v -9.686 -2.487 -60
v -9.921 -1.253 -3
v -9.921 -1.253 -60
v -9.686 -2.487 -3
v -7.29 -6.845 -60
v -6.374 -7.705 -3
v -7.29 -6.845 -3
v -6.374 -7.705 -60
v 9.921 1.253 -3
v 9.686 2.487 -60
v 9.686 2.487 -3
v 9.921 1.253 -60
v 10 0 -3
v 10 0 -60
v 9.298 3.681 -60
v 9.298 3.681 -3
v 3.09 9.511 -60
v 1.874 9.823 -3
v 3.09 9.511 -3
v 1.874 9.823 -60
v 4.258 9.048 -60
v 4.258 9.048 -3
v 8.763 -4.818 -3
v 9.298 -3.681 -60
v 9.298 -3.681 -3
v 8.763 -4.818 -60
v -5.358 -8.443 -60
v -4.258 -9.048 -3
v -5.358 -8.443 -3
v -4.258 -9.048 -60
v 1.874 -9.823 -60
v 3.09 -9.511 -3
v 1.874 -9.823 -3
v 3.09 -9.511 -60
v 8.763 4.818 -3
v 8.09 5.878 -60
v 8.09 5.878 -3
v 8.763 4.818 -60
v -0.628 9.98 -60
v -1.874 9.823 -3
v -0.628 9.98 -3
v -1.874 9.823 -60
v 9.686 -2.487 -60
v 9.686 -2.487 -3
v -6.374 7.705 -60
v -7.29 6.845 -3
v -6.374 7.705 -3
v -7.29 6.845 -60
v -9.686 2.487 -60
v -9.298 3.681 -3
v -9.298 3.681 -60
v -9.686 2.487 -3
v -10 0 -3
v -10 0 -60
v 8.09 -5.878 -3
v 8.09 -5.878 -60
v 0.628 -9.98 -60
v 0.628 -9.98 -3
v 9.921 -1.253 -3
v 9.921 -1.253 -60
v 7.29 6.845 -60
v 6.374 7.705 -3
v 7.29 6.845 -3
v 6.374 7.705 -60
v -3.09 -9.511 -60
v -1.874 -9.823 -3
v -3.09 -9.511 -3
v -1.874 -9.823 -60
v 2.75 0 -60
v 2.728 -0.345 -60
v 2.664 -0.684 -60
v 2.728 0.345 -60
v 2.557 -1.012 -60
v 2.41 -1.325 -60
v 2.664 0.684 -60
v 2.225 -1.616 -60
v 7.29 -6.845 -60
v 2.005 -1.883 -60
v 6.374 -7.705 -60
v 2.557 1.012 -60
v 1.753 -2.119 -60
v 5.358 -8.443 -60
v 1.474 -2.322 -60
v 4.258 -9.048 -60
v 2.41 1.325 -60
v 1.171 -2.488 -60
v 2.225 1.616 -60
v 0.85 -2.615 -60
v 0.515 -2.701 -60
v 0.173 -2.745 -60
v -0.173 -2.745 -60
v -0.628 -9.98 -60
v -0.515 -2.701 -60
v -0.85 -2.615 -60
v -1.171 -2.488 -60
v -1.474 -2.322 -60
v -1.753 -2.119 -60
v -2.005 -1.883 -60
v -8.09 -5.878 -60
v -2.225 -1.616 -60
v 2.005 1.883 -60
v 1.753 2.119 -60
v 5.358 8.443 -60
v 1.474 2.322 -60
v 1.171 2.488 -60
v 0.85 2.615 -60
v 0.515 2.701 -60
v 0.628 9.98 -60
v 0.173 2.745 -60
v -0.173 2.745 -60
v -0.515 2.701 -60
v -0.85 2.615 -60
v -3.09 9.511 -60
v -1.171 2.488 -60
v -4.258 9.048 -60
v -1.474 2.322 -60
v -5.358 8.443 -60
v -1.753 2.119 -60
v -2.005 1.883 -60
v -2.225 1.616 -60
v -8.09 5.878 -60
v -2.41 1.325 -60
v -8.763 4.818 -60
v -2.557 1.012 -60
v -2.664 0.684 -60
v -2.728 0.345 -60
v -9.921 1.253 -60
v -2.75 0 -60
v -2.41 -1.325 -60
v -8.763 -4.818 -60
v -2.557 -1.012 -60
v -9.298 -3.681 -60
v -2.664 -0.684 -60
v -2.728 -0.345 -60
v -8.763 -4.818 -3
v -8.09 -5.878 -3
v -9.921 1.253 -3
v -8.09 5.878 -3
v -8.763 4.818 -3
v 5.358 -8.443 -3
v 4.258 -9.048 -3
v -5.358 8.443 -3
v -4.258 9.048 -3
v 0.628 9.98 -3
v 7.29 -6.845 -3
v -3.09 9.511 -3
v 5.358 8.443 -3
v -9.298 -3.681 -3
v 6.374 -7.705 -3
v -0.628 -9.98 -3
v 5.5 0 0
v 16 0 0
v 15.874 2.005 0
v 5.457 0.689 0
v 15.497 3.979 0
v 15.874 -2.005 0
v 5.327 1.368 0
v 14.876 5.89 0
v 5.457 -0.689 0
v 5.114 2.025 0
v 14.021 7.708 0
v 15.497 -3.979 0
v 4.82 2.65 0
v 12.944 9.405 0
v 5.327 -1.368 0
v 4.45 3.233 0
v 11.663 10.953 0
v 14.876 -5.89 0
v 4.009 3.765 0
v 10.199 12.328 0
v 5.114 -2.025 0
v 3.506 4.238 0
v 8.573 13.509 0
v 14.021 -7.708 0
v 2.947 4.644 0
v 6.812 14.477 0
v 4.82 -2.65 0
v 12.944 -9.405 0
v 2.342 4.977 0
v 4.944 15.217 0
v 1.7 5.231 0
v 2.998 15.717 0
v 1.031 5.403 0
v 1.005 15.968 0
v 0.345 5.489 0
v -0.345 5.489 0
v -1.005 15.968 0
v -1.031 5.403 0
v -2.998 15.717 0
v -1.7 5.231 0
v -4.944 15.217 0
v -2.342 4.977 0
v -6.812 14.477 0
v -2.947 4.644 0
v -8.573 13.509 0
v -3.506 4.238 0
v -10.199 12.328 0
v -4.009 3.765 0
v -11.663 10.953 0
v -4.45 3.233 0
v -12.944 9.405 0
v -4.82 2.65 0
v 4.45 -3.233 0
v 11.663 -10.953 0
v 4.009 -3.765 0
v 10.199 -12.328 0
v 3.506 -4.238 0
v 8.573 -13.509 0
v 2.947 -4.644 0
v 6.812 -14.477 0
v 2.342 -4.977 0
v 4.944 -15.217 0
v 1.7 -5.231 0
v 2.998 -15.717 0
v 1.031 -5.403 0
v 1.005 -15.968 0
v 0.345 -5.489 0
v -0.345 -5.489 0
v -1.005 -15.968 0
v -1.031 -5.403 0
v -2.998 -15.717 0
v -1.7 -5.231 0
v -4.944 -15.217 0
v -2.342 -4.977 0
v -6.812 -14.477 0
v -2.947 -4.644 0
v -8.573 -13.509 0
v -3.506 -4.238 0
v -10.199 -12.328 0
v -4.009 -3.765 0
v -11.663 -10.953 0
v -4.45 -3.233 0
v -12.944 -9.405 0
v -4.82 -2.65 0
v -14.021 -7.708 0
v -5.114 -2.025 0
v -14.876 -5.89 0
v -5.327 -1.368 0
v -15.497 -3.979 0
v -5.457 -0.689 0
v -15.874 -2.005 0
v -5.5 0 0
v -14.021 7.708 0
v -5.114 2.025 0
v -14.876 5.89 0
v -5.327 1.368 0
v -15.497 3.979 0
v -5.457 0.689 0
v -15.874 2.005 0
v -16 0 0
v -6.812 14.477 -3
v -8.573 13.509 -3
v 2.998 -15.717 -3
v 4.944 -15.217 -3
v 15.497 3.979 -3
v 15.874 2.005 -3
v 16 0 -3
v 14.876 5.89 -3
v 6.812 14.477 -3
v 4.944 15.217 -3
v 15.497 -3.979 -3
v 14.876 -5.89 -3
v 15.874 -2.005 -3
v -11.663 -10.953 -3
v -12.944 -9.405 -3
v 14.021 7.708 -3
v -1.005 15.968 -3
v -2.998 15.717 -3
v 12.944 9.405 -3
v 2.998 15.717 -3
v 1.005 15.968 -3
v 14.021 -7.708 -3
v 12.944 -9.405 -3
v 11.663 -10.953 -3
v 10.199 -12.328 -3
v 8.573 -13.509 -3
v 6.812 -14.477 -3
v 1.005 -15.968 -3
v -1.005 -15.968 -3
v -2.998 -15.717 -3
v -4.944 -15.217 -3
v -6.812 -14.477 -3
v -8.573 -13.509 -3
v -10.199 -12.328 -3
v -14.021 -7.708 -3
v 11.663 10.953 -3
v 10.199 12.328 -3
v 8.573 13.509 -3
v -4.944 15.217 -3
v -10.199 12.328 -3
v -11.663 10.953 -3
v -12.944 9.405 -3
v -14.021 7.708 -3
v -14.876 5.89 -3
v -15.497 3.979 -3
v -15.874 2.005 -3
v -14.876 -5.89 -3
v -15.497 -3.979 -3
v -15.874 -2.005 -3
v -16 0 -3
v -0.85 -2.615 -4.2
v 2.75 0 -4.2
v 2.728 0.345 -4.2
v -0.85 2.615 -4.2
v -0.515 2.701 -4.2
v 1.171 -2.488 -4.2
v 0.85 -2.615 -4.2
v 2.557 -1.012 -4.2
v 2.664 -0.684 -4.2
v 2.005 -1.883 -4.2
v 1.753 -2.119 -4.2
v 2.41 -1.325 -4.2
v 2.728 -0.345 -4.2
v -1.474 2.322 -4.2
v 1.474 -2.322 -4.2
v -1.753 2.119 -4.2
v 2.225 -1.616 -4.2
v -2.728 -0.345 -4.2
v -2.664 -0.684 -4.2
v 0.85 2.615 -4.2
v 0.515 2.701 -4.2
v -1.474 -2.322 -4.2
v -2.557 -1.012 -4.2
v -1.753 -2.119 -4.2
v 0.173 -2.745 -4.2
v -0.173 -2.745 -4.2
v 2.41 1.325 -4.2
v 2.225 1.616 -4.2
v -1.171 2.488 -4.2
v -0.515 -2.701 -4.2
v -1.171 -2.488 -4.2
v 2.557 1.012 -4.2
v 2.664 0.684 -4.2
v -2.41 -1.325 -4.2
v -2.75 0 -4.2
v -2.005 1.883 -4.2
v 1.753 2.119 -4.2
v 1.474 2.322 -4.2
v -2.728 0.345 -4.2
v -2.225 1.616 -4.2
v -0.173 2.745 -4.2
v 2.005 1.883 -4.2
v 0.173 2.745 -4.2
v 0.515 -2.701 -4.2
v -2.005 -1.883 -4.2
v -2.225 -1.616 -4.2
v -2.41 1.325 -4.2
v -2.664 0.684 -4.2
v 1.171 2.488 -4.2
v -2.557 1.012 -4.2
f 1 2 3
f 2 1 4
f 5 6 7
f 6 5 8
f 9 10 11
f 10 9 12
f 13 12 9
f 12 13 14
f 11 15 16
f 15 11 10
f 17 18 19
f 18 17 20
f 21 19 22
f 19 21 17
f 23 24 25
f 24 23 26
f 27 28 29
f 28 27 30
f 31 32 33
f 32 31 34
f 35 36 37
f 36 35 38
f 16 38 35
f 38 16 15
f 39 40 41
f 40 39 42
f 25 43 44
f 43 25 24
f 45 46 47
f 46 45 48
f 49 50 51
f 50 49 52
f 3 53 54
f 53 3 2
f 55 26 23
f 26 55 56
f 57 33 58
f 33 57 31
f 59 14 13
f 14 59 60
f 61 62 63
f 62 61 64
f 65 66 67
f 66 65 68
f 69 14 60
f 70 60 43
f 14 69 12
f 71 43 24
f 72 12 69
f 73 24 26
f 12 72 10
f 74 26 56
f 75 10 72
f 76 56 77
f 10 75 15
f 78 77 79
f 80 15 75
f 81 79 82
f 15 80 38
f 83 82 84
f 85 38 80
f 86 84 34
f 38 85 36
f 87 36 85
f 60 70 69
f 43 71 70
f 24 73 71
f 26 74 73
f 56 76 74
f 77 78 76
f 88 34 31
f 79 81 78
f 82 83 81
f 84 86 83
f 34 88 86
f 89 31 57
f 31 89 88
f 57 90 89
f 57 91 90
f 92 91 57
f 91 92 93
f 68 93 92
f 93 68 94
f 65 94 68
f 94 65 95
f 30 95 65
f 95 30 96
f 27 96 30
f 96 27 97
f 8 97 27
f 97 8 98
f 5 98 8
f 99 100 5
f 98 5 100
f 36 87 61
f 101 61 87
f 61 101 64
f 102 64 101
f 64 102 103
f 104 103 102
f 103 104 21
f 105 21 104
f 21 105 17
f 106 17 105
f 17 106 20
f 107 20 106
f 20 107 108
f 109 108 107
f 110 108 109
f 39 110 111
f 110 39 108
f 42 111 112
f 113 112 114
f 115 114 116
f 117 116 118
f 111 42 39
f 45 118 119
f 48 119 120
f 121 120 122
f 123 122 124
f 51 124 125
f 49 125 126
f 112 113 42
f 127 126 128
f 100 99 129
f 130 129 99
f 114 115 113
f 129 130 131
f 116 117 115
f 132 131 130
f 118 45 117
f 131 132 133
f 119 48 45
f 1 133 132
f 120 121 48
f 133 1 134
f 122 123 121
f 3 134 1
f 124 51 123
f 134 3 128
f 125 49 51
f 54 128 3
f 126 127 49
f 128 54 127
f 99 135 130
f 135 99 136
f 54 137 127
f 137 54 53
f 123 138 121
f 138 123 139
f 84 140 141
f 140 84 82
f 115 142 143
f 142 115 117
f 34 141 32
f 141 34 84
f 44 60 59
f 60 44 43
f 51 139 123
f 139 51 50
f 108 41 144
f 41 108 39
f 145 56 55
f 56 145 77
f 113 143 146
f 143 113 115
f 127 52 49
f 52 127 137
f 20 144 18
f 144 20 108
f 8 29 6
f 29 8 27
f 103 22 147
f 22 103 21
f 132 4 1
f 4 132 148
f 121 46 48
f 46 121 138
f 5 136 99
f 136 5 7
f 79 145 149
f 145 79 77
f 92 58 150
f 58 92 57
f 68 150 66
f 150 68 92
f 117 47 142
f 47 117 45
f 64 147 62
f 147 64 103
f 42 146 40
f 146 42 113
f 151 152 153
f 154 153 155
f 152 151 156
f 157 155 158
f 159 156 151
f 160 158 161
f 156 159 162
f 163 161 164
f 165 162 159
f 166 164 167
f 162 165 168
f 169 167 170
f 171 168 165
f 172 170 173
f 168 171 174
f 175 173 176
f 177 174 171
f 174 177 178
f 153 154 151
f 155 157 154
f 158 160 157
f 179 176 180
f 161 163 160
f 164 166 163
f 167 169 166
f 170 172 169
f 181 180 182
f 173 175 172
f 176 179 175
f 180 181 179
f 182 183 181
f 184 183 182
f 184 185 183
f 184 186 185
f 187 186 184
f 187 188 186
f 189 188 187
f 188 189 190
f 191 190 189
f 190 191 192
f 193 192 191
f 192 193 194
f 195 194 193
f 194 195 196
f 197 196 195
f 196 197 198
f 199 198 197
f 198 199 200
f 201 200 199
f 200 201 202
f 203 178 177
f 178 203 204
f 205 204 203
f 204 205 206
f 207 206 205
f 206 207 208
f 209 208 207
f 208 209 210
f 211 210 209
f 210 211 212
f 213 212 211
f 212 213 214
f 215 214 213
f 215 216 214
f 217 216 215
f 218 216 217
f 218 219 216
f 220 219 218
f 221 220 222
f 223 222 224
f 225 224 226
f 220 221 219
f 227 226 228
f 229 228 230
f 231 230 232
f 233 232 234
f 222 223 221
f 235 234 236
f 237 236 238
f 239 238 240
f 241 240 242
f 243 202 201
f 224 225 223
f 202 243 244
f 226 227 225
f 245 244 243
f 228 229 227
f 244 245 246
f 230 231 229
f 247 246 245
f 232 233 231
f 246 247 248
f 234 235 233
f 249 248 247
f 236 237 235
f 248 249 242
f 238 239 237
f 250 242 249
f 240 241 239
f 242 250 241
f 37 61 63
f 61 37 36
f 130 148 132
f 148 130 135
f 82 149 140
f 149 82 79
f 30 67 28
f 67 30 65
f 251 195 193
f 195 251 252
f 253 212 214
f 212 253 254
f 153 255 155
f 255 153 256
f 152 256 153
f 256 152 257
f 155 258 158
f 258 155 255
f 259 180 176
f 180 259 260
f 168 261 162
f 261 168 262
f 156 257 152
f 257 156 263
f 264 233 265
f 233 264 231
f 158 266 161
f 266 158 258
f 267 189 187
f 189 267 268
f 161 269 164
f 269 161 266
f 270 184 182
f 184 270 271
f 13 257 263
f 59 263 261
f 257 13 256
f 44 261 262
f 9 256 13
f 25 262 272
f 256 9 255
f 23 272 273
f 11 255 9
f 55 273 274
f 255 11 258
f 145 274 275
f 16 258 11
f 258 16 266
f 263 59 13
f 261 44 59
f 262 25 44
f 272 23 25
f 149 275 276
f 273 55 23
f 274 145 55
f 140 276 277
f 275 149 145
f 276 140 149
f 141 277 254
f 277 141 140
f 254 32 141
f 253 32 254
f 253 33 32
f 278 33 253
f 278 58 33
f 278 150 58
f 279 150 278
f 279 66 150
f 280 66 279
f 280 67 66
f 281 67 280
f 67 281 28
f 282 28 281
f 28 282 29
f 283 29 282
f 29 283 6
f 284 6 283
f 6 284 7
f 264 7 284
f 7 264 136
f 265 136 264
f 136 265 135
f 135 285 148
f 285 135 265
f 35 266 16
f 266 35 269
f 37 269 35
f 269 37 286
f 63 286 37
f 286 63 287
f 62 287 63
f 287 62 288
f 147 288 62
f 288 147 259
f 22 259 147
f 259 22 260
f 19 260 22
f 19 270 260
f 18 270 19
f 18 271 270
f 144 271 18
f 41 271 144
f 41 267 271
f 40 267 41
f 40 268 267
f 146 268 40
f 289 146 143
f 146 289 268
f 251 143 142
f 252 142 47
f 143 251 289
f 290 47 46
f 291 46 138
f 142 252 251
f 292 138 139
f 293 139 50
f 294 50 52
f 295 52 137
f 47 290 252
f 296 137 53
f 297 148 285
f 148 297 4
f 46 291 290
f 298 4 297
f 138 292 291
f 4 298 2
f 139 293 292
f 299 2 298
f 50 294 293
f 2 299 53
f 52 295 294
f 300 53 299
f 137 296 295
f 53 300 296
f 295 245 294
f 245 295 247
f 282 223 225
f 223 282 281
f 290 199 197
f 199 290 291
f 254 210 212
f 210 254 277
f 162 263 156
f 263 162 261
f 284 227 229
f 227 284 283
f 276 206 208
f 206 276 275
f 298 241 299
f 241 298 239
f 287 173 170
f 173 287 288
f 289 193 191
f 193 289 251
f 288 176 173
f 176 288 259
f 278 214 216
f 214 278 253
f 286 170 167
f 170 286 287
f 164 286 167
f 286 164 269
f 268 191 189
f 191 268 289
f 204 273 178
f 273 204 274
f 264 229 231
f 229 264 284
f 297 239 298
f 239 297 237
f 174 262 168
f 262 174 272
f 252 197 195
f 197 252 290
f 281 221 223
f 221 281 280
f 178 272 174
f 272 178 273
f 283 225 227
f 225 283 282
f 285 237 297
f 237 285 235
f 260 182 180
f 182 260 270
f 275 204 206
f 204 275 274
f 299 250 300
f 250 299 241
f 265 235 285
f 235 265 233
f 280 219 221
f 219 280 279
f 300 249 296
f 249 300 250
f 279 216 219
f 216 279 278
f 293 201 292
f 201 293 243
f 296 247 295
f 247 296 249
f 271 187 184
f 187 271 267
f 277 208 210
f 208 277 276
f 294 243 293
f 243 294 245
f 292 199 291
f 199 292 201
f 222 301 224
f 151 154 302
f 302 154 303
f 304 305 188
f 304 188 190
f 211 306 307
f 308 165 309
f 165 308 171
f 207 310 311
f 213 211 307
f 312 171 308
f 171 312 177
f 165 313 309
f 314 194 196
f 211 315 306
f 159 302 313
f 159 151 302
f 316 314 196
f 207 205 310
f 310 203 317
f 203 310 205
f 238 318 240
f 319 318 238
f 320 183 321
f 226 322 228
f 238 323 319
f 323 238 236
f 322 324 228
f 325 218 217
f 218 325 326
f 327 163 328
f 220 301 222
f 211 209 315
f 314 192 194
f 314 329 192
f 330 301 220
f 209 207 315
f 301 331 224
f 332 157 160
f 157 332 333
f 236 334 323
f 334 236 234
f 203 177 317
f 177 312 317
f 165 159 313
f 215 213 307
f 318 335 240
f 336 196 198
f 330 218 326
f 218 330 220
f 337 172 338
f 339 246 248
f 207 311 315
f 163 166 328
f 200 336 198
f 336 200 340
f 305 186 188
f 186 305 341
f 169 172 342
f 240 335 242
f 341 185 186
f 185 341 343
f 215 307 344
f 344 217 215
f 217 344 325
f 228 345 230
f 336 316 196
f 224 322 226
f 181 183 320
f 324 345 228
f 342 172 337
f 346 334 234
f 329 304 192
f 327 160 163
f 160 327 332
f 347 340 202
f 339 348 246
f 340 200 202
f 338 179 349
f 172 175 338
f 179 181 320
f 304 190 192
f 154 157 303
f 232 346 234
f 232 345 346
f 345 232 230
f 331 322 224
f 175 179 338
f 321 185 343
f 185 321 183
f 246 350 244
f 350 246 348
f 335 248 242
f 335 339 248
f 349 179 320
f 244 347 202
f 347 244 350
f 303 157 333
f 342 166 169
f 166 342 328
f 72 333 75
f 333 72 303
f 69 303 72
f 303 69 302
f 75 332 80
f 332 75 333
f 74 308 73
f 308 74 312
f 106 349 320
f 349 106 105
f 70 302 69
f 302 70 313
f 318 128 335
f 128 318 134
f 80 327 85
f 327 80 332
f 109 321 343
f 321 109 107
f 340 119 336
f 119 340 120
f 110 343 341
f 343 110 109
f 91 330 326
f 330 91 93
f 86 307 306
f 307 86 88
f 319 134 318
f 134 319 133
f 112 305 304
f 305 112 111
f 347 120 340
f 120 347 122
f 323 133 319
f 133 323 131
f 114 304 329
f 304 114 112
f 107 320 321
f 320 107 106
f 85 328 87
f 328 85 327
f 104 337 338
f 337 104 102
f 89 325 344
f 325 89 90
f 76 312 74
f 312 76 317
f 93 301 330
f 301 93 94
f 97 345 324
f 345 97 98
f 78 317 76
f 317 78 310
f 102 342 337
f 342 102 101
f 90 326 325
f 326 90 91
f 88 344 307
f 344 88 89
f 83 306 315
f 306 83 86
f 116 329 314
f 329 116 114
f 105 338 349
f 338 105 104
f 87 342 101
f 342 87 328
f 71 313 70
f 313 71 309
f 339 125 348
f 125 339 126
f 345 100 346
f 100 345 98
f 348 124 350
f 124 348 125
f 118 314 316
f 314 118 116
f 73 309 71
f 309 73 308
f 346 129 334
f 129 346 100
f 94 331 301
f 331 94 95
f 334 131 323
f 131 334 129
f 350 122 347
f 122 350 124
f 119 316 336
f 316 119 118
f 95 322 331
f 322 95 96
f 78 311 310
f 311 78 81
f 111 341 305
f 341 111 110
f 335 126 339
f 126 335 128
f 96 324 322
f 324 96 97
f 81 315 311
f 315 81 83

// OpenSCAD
$fn = 50;


difference() {
	union() {
		translate(v = [0, 0, -60.0000000000]) {
			cylinder(h = 60, r = 10.0000000000);
		}
		translate(v = [0, 0, -3.0000000000]) {
			cylinder(h = 3, r = 16.0000000000);
		}
	}
	union() {
		translate(v = [0, 0, 0]) {
			rotate(a = [0, 0, 0]) {
				difference() {
					union() {
						#translate(v = [0, 0, -60.0000000000]) {
							cylinder(h = 60, r = 2.2500000000);
						}
						#translate(v = [0, 0, -4.2000000000]) {
							cylinder(h = 4.2000000000, r1 = 2.7500000000, r2 = 5.5000000000);
						}
						#translate(v = [0, 0, -60.0000000000]) {
							cylinder(h = 60, r = 2.7500000000);
						}
						#translate(v = [0, 0, -60.0000000000]) {
							cylinder(h = 60, r = 2.2500000000);
						}
					}
					union();
				}
			}
		}
	}
}
